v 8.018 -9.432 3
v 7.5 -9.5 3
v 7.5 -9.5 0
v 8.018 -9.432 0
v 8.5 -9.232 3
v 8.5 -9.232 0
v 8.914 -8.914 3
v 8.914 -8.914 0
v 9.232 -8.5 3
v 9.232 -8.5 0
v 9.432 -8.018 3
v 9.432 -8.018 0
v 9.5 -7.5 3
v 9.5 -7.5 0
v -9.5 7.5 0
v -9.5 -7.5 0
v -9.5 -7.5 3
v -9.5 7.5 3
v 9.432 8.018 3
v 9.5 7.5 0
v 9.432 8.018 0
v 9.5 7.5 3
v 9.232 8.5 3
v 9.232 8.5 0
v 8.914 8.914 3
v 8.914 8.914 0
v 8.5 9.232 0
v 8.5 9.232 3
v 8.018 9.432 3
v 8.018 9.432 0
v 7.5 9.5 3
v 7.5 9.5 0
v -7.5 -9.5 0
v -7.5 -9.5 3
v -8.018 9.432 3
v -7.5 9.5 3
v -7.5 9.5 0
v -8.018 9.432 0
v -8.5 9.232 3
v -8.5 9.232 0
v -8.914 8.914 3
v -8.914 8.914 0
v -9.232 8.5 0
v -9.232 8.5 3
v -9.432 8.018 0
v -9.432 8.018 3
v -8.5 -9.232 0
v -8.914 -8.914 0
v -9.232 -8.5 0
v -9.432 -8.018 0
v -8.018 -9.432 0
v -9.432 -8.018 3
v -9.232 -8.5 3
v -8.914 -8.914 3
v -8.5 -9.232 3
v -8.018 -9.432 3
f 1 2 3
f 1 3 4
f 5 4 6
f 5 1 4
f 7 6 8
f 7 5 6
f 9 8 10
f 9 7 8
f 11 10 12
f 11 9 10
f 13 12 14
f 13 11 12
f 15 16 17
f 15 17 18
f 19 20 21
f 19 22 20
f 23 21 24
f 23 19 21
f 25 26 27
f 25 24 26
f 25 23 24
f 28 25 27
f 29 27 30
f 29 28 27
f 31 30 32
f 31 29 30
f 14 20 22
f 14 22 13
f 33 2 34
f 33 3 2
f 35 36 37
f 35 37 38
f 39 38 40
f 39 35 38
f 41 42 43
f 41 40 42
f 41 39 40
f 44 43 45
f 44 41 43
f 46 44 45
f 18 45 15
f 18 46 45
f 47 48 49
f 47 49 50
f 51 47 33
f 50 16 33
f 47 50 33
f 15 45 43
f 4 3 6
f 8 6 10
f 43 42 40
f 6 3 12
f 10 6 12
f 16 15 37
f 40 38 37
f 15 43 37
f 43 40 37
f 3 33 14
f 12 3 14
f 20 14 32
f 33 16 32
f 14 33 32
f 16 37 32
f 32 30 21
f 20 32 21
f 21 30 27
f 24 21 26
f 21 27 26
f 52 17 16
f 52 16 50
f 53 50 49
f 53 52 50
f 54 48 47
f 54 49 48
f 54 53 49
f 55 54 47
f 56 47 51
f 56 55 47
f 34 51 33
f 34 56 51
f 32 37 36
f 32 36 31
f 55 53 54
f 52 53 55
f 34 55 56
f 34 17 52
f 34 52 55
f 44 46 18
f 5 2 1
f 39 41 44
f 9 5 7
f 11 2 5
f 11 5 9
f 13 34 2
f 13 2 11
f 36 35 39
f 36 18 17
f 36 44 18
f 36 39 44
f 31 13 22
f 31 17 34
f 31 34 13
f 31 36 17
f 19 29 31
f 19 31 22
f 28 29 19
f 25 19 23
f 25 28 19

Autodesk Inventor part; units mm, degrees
ref_plane "YZ Plane" through (0, 0, 0) normal (1, 0, 0) x (0, 1, 0)
ref_plane "XZ Plane" through (0, 0, 0) normal (0, 1, 0) x (-1, 0, 0)
ref_plane "XY Plane" through (0, 0, 0) normal (0, 0, 1) x (1, 0, 0)
sketch "草图1" plane through (0, 0, 0) normal (0, 0, 1) x (1, 0, 0)
  line L0 (9.5, -9.5) -> (-9.5, -9.5)
  line L1 (-9.5, -9.5) -> (-9.5, 9.5)
  line L2 (-9.5, 9.5) -> (9.5, 9.5)
  line L3 (9.5, 9.5) -> (9.5, -9.5)
  line L4 (9.5, -9.5) -> (-9.5, 9.5) construction
  line L5 (-9.5, -9.5) -> (9.5, 9.5) construction
  point P0 (0, 0)
  dimension "d0" = 19
  dimension "d1" = 19
extrude "拉伸1" add sketch "草图1" along normal blind 3
fillet "圆角1" radius 2 4 edges at (-9.5, -9.5, 1.5) (9.5, -9.5, 1.5) (9.5, 9.5, 1.5) (-9.5, 9.5, 1.5)
sketch "草图2" plane through (0, 0, 0) normal (0, 0, -1) x (-1, 0, 0)
  point P0 (0, 0)
properties part number "实体8"
